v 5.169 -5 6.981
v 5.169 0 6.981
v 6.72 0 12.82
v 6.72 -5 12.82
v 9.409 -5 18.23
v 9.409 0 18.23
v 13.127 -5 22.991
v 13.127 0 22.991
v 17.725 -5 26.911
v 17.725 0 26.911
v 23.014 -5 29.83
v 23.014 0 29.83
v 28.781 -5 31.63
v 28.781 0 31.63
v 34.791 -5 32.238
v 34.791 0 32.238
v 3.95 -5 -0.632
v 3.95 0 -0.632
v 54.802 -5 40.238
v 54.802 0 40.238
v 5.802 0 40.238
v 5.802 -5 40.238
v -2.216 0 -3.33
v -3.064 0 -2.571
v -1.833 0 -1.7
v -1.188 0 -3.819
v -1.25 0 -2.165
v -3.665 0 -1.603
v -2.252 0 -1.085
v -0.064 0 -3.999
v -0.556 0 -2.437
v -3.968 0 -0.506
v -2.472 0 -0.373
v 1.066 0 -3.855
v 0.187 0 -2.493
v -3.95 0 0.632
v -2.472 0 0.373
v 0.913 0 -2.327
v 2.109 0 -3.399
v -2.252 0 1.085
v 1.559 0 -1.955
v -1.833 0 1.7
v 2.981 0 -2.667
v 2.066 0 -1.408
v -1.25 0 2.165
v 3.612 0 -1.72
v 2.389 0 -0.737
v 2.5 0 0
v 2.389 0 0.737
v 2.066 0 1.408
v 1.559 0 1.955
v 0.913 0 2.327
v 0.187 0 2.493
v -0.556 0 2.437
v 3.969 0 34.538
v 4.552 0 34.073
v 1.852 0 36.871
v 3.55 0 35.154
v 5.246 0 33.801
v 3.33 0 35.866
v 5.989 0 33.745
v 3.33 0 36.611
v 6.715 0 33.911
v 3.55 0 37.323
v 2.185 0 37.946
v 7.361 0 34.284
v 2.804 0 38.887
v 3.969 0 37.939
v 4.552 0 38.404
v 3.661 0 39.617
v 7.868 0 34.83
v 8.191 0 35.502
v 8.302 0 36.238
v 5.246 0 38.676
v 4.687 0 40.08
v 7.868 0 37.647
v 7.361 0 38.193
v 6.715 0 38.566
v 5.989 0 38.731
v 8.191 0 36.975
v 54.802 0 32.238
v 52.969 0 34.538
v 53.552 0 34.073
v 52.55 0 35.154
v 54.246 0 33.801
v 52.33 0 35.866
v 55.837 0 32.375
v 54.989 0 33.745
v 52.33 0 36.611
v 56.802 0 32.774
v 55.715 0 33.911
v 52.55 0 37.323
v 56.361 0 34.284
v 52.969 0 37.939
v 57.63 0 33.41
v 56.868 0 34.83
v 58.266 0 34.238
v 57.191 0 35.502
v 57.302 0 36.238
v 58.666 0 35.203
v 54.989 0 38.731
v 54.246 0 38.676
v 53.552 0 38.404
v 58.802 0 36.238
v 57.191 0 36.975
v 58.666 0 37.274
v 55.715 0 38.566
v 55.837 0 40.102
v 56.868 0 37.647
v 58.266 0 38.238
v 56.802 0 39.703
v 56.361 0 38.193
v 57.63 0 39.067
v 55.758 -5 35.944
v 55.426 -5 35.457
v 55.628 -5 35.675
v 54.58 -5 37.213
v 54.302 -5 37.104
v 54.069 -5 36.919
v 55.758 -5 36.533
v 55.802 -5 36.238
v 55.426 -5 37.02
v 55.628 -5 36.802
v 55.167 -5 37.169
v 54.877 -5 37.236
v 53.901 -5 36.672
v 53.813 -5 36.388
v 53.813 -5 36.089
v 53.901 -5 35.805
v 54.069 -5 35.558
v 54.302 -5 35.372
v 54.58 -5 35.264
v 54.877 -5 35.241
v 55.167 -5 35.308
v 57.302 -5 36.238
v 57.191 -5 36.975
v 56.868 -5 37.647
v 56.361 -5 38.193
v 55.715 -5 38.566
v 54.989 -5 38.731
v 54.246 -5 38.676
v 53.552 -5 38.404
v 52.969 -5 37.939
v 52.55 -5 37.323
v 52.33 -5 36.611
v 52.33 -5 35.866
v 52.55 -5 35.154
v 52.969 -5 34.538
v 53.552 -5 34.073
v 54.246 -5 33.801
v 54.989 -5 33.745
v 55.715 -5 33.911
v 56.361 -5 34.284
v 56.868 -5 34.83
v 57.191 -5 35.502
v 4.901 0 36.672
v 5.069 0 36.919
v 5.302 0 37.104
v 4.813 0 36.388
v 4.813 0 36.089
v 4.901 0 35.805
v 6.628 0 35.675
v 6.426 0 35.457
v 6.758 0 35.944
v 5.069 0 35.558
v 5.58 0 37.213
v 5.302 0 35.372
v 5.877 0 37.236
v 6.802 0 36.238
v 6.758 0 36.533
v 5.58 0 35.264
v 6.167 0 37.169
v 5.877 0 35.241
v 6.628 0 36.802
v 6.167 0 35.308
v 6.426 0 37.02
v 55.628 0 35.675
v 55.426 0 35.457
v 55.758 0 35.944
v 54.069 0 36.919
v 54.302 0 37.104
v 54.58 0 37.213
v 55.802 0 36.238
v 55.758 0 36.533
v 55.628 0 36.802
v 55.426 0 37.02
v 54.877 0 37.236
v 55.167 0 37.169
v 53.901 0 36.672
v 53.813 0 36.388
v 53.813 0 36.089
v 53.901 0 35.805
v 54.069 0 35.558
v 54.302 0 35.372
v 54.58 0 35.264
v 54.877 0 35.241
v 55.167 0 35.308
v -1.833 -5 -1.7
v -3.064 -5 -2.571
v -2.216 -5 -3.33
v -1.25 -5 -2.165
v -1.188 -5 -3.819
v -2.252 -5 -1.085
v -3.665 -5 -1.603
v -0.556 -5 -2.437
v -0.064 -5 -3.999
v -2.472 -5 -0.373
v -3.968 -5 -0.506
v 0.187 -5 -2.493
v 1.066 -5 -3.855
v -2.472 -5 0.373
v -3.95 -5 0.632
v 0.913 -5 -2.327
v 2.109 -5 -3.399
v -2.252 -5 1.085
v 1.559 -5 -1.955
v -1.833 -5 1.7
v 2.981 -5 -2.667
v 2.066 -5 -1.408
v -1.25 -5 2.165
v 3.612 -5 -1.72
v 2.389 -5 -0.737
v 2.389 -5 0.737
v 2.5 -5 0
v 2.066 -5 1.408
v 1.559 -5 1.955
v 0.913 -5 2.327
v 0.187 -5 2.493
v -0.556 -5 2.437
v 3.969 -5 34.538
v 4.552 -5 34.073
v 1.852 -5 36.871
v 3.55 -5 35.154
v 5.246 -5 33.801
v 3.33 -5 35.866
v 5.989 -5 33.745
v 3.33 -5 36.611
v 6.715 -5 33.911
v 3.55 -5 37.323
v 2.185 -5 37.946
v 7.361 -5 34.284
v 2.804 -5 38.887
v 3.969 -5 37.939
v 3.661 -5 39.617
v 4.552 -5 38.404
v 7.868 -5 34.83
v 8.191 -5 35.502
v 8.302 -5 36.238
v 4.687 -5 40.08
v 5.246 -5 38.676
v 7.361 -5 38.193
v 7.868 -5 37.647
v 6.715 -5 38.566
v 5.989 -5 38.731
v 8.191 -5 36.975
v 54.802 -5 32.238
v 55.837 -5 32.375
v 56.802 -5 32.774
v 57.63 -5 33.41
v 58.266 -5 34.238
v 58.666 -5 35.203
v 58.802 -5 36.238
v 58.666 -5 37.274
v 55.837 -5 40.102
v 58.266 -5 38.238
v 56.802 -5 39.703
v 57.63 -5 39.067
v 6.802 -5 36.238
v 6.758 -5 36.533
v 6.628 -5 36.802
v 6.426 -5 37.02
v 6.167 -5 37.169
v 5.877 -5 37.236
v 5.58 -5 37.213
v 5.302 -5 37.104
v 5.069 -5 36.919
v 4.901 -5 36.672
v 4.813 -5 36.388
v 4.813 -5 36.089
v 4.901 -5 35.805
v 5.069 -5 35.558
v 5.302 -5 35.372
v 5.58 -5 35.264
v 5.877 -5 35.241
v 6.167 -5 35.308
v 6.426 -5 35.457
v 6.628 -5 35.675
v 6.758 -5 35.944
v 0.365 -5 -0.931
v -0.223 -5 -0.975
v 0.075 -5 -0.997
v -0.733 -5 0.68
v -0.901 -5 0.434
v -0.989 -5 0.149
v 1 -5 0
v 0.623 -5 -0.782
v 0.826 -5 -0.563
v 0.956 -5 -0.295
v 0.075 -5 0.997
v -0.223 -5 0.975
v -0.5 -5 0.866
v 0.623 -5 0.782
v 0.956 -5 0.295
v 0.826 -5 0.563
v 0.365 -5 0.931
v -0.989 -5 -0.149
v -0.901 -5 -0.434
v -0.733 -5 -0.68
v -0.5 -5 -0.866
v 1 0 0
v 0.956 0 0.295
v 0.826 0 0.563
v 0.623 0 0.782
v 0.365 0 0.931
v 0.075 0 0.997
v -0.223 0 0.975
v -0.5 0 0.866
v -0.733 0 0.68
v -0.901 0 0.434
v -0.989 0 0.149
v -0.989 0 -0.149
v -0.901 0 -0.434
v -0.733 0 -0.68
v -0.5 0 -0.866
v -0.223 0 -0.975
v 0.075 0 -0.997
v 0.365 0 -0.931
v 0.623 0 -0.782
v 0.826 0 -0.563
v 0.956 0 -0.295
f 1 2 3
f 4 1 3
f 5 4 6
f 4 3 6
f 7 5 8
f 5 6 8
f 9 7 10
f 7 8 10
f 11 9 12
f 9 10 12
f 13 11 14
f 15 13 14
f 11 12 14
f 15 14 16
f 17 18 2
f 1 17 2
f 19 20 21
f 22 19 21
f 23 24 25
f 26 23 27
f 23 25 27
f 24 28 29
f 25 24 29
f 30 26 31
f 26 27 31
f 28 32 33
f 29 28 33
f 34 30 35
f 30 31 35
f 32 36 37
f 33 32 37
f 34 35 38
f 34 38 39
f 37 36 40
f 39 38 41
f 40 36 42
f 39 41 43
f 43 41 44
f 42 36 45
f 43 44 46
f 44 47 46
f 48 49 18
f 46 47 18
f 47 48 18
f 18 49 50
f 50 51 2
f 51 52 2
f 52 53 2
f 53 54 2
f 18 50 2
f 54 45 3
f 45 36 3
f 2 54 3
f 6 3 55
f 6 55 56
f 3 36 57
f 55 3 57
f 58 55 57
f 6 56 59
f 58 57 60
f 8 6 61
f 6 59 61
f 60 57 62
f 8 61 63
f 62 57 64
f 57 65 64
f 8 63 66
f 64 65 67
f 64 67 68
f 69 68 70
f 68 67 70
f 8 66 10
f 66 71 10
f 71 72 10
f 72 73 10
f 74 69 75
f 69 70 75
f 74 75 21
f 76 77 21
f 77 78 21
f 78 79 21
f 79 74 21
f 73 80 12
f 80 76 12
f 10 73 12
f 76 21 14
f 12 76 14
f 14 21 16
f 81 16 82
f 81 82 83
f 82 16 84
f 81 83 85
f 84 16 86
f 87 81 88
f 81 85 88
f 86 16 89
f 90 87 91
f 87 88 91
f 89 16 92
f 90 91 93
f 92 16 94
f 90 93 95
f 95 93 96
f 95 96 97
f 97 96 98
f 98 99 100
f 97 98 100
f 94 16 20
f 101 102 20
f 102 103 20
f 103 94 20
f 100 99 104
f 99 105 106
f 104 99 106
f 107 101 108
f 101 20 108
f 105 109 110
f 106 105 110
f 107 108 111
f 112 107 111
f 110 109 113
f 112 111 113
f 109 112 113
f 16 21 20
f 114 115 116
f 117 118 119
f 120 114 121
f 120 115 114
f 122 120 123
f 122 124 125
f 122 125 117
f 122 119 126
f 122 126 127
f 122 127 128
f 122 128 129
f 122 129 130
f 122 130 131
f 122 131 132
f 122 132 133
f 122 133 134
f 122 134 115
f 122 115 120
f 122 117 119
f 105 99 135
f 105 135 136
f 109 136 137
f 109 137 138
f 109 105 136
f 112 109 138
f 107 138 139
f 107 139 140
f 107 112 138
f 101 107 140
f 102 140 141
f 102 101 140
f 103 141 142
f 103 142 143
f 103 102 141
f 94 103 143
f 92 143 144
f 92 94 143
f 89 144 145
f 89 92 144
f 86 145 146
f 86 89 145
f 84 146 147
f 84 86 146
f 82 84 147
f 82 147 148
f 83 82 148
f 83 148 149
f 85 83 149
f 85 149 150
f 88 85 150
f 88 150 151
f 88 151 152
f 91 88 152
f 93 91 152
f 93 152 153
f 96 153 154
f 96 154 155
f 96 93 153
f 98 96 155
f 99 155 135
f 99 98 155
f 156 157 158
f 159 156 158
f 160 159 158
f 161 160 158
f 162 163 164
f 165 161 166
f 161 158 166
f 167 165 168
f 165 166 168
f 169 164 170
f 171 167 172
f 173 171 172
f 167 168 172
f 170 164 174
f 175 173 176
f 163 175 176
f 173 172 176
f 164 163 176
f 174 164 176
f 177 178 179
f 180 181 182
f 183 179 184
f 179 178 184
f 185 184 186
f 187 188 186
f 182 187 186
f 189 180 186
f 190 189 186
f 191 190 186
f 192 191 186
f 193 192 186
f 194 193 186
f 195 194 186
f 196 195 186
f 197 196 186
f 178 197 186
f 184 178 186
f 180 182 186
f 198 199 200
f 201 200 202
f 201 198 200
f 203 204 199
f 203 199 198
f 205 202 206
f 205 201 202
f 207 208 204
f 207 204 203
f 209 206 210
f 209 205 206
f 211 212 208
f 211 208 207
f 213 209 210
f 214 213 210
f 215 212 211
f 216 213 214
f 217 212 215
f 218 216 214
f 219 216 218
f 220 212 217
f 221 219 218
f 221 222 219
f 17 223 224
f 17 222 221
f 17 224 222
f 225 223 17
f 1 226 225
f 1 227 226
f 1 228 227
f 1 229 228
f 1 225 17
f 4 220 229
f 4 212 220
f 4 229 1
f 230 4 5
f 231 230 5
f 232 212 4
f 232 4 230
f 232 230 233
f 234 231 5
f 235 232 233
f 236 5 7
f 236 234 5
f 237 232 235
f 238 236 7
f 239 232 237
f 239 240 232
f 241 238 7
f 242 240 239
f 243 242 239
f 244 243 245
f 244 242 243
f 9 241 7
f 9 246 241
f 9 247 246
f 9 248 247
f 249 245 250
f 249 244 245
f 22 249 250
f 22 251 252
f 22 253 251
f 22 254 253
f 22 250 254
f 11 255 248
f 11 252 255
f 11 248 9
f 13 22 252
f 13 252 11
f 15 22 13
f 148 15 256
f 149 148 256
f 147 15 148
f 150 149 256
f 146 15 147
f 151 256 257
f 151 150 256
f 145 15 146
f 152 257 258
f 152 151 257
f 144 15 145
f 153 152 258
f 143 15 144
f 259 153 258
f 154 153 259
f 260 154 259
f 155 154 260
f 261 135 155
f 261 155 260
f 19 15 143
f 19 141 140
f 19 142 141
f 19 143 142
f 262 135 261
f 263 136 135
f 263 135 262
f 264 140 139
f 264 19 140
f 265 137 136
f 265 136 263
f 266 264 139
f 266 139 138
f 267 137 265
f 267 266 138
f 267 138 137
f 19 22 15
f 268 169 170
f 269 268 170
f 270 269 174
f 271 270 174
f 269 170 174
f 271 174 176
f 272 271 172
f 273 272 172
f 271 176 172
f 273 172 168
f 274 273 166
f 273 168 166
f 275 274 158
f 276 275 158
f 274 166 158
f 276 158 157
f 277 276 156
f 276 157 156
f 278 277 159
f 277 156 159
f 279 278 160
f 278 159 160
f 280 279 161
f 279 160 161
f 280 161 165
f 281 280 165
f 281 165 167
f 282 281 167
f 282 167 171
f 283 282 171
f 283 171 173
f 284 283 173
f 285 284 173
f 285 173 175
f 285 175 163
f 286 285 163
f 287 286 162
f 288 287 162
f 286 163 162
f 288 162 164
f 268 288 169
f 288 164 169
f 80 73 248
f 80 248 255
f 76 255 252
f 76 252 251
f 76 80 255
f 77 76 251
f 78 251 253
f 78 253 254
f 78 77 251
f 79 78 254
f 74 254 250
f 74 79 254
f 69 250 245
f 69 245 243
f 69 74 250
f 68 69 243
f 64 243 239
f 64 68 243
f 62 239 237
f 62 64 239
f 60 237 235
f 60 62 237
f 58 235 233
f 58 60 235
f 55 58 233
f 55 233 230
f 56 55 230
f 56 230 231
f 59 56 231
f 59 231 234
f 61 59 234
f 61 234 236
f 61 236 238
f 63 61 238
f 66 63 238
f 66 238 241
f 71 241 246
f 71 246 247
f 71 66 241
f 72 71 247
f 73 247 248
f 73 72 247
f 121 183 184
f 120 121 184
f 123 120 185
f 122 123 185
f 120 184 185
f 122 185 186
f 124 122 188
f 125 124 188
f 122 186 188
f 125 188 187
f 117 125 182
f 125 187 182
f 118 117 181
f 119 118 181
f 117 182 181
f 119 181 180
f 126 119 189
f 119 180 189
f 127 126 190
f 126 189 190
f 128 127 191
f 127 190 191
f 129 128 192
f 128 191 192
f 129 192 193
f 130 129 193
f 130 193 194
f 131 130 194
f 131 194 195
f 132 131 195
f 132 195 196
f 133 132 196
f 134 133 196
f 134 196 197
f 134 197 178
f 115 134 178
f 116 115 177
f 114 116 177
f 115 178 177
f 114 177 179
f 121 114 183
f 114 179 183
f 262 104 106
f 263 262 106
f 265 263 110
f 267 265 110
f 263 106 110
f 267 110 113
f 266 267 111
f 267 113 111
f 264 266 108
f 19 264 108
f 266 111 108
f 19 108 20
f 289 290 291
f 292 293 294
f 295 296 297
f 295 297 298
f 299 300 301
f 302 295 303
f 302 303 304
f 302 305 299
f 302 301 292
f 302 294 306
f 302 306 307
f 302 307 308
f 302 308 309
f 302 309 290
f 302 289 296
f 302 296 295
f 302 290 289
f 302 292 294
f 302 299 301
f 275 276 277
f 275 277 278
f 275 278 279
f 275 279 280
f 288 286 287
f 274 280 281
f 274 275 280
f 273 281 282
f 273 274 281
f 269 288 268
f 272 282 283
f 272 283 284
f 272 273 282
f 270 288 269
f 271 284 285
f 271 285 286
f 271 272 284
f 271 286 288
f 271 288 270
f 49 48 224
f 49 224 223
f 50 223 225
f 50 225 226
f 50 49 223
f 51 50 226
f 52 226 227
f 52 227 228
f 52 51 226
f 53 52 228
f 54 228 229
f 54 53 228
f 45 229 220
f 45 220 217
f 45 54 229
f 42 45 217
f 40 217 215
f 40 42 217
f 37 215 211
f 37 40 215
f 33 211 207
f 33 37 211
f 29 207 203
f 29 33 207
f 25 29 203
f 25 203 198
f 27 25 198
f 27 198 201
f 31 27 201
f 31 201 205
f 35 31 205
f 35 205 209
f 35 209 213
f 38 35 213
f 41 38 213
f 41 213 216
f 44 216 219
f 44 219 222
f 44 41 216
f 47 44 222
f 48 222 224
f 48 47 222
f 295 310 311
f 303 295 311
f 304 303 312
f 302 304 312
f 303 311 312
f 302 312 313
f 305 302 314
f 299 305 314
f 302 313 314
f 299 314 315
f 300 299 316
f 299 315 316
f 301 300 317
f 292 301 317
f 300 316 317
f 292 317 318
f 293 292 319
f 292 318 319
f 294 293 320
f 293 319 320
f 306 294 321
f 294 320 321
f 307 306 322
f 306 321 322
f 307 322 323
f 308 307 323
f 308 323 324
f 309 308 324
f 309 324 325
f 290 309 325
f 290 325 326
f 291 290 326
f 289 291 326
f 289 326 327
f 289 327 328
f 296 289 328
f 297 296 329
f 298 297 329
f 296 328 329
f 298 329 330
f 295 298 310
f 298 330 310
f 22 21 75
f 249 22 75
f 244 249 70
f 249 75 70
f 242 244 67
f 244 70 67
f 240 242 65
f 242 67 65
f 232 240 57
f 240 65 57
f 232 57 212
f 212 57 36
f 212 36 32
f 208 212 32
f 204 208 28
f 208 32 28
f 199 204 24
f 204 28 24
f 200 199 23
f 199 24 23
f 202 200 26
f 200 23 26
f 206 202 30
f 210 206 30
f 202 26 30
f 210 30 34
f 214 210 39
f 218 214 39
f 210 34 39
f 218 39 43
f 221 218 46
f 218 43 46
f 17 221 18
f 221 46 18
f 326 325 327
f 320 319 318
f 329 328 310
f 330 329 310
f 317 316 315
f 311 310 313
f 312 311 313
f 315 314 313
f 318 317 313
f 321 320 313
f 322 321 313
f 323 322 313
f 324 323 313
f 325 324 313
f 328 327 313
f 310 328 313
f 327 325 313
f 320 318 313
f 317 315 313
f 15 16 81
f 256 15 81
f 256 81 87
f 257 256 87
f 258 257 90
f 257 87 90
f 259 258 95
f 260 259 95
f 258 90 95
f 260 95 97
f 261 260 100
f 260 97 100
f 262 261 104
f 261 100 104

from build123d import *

# Parameters (mm, degrees)
F0_R     = 2.5
F0_R_2   = 1
F1_DEPTH = 5


with BuildPart() as f1:
    # F0 (on Front) → F1 (new body)
    with BuildSketch(Plane.XZ):
        with BuildLine():
            ThreePointArc((3.949696, -0.632375), (3.987404, -0.317186), (4, 0))
            ThreePointArc((4, 0), (0.317186, 3.987404), (-3.949696, 0.632375))
            ThreePointArc((-3.949696, 0.632375), (-0.632375, -3.949696), (3.949696, -0.632375))
        make_face()
        Circle(F0_R, mode=Mode.SUBTRACT)
        with BuildLine():
            ThreePointArc((-3.949696, 0.632375), (0.317186, 3.987404), (4, 0))
            ThreePointArc((4, 0), (3.987404, -0.317186), (3.949696, -0.632375))
            Line((3.949696, -0.632375), (5.168697, 6.981277))
            ThreePointArc((5.168697, 6.981277), (15.32715, 25.067004), (34.791421, 32.238465))
            Line((34.791421, 32.238465), (54.802041, 32.238465))
            ThreePointArc((54.802041, 32.238465), (50.802041, 36.238465), (54.802041, 40.238465))
            Line((54.802041, 40.238465), (5.802041, 40.238465))
            ThreePointArc((5.802041, 40.238465), (8.630468, 39.066892), (9.802041, 36.238465))
            ThreePointArc((9.802041, 36.238465), (5.484855, 32.25106), (1.852344, 36.87084))
            Line((1.852344, 36.87084), (-3.949696, 0.632375))
        make_face()
        with BuildLine():
            ThreePointArc((5.802041, 40.238465), (3.206805, 39.28227), (1.852344, 36.87084))
            ThreePointArc((1.852344, 36.87084), (5.484855, 32.25106), (9.802041, 36.238465))
            ThreePointArc((9.802041, 36.238465), (8.630468, 39.066892), (5.802041, 40.238465))
        make_face()
        with Locations((5.802041, 36.238465)):
            Circle(F0_R, mode=Mode.SUBTRACT)
        with BuildLine():
            ThreePointArc((58.802041, 36.238465), (57.630468, 39.066892), (54.802041, 40.238465))
            ThreePointArc((54.802041, 40.238465), (50.802041, 36.238465), (54.802041, 32.238465))
            ThreePointArc((54.802041, 32.238465), (57.630468, 33.410038), (58.802041, 36.238465))
        make_face()
        with Locations((54.802041, 36.238465)):
            Circle(F0_R, mode=Mode.SUBTRACT)
        with Locations((5.802041, 36.238465)):
            Circle(F0_R_2)
        Circle(F0_R_2)
        with Locations((54.802041, 36.238465)):
            Circle(F0_R_2)
    extrude(amount=F1_DEPTH)


solid = f1.part
